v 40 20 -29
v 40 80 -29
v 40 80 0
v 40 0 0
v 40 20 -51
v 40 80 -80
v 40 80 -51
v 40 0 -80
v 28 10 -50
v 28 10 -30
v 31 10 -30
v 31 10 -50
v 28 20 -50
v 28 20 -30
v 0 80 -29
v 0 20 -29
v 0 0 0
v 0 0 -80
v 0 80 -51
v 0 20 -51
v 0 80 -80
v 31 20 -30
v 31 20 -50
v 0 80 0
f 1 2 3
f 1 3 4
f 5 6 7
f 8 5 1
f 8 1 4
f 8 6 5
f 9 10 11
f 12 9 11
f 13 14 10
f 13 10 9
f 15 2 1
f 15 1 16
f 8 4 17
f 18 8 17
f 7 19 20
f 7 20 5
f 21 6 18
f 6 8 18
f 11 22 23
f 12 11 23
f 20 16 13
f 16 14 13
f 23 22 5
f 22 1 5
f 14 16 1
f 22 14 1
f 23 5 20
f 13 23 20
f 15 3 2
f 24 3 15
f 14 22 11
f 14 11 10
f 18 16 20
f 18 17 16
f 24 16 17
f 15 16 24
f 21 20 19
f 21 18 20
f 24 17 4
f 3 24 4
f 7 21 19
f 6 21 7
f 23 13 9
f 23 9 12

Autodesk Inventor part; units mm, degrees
ref_plane "YZ Plane" through (0, 0, 0) normal (1, 0, 0) x (0, 1, 0)
ref_plane "XZ Plane" through (0, 0, 0) normal (0, 1, 0) x (-1, 0, 0)
ref_plane "XY Plane" through (0, 0, 0) normal (0, 0, 1) x (1, 0, 0)
sketch "Esquisse1" plane through (0, 0, 0) normal (0, 1, 0) x (-1, 0, 0)
  line L0 (0, 0) -> (-40, 0)
  line L1 (-40, 0) -> (-40, -80)
  line L2 (-40, -80) -> (0, -80)
  line L3 (0, -80) -> (0, 0)
  dimension "d0" = 80
  dimension "d4" = 40
extrude "Extrusion1" add sketch "Esquisse1" along normal blind 80
sketch "Esquisse2" plane through (40, 0, 0) normal (1, 0, 0) x (0, 0, -1)
  point P0 (0, 0)
sketch "Esquisse3" plane through (40, 0, 0) normal (1, 0, 0) x (0, 0, -1)
  line L0 (0, 80) -> (80, 80) projected
  line L1 (20, 20) -> (60, 20)
  line L2 (60, 20) -> (60, 80)
  line L3 (60, 80) -> (20, 80)
  line L4 (20, 80) -> (20, 20)
  line L5 (0, 0) -> (80, 0) projected
  line L6 (80, 0) -> (80, 80) projected
  line L7 (0, 0) -> (0, 80) projected
  point P0 (20, 80)
  dimension "d9" = 20
  dimension "d10" = 20
  dimension "d11" = 20
extrude "Extrusion2" cut sketch "Esquisse3" against normal blind 80 contours L0 L2 L1 L4
sketch "Esquisse4" plane through (40, 20, -20) normal (0, 1, 0) x (1, 0, 0)
  line L0 (0, 40) -> (-40, 40) projected
  line L1 (0, 0) -> (-5, 0)
  line L2 (-5, 40) -> (0, 40)
  line L3 (0, 40) -> (0, 0)
  line L4 (-5, 40) -> (-10, 40)
  line L5 (-9, 10) -> (-12, 10)
  line L6 (-12, 10) -> (-12, 30)
  line L7 (-12, 30) -> (-9, 30)
  line L8 (-9, 10) -> (-9, 30)
  point P0 (-40, -20)
  dimension "d19" = 20
  dimension "d21" = 9
  dimension "d22" = 3
extrude "Extrusion3" cut sketch "Esquisse4" against normal blind 10
sketch "Esquisse6" plane through (40, 20, -20) normal (0, 0, -1) x (-1, 0, 0)
  line L0 (40, 60) -> (40, 0) projected
  line L1 (0, 60) -> (40, 60) projected
  line L2 (0, 0) -> (0, 60) projected
  line L3 (0, 0) -> (40, 0) projected
  point P0 (40, -20)
extrude "Extrusion4" add sketch "Esquisse6" along normal blind 9
sketch "Esquisse7" plane through (40, 20, -60) normal (0, 0, 1) x (1, 0, 0)
  line L0 (-40, 0) -> (-40, 60) projected
  line L1 (0, 0) -> (-40, 0) projected
  line L2 (0, 60) -> (0, 0) projected
  line L3 (-40, 60) -> (0, 60) projected
  point P0 (-40, -20)
extrude "Extrusion5" add sketch "Esquisse7" along normal blind 9
properties part number "Intsragam"
